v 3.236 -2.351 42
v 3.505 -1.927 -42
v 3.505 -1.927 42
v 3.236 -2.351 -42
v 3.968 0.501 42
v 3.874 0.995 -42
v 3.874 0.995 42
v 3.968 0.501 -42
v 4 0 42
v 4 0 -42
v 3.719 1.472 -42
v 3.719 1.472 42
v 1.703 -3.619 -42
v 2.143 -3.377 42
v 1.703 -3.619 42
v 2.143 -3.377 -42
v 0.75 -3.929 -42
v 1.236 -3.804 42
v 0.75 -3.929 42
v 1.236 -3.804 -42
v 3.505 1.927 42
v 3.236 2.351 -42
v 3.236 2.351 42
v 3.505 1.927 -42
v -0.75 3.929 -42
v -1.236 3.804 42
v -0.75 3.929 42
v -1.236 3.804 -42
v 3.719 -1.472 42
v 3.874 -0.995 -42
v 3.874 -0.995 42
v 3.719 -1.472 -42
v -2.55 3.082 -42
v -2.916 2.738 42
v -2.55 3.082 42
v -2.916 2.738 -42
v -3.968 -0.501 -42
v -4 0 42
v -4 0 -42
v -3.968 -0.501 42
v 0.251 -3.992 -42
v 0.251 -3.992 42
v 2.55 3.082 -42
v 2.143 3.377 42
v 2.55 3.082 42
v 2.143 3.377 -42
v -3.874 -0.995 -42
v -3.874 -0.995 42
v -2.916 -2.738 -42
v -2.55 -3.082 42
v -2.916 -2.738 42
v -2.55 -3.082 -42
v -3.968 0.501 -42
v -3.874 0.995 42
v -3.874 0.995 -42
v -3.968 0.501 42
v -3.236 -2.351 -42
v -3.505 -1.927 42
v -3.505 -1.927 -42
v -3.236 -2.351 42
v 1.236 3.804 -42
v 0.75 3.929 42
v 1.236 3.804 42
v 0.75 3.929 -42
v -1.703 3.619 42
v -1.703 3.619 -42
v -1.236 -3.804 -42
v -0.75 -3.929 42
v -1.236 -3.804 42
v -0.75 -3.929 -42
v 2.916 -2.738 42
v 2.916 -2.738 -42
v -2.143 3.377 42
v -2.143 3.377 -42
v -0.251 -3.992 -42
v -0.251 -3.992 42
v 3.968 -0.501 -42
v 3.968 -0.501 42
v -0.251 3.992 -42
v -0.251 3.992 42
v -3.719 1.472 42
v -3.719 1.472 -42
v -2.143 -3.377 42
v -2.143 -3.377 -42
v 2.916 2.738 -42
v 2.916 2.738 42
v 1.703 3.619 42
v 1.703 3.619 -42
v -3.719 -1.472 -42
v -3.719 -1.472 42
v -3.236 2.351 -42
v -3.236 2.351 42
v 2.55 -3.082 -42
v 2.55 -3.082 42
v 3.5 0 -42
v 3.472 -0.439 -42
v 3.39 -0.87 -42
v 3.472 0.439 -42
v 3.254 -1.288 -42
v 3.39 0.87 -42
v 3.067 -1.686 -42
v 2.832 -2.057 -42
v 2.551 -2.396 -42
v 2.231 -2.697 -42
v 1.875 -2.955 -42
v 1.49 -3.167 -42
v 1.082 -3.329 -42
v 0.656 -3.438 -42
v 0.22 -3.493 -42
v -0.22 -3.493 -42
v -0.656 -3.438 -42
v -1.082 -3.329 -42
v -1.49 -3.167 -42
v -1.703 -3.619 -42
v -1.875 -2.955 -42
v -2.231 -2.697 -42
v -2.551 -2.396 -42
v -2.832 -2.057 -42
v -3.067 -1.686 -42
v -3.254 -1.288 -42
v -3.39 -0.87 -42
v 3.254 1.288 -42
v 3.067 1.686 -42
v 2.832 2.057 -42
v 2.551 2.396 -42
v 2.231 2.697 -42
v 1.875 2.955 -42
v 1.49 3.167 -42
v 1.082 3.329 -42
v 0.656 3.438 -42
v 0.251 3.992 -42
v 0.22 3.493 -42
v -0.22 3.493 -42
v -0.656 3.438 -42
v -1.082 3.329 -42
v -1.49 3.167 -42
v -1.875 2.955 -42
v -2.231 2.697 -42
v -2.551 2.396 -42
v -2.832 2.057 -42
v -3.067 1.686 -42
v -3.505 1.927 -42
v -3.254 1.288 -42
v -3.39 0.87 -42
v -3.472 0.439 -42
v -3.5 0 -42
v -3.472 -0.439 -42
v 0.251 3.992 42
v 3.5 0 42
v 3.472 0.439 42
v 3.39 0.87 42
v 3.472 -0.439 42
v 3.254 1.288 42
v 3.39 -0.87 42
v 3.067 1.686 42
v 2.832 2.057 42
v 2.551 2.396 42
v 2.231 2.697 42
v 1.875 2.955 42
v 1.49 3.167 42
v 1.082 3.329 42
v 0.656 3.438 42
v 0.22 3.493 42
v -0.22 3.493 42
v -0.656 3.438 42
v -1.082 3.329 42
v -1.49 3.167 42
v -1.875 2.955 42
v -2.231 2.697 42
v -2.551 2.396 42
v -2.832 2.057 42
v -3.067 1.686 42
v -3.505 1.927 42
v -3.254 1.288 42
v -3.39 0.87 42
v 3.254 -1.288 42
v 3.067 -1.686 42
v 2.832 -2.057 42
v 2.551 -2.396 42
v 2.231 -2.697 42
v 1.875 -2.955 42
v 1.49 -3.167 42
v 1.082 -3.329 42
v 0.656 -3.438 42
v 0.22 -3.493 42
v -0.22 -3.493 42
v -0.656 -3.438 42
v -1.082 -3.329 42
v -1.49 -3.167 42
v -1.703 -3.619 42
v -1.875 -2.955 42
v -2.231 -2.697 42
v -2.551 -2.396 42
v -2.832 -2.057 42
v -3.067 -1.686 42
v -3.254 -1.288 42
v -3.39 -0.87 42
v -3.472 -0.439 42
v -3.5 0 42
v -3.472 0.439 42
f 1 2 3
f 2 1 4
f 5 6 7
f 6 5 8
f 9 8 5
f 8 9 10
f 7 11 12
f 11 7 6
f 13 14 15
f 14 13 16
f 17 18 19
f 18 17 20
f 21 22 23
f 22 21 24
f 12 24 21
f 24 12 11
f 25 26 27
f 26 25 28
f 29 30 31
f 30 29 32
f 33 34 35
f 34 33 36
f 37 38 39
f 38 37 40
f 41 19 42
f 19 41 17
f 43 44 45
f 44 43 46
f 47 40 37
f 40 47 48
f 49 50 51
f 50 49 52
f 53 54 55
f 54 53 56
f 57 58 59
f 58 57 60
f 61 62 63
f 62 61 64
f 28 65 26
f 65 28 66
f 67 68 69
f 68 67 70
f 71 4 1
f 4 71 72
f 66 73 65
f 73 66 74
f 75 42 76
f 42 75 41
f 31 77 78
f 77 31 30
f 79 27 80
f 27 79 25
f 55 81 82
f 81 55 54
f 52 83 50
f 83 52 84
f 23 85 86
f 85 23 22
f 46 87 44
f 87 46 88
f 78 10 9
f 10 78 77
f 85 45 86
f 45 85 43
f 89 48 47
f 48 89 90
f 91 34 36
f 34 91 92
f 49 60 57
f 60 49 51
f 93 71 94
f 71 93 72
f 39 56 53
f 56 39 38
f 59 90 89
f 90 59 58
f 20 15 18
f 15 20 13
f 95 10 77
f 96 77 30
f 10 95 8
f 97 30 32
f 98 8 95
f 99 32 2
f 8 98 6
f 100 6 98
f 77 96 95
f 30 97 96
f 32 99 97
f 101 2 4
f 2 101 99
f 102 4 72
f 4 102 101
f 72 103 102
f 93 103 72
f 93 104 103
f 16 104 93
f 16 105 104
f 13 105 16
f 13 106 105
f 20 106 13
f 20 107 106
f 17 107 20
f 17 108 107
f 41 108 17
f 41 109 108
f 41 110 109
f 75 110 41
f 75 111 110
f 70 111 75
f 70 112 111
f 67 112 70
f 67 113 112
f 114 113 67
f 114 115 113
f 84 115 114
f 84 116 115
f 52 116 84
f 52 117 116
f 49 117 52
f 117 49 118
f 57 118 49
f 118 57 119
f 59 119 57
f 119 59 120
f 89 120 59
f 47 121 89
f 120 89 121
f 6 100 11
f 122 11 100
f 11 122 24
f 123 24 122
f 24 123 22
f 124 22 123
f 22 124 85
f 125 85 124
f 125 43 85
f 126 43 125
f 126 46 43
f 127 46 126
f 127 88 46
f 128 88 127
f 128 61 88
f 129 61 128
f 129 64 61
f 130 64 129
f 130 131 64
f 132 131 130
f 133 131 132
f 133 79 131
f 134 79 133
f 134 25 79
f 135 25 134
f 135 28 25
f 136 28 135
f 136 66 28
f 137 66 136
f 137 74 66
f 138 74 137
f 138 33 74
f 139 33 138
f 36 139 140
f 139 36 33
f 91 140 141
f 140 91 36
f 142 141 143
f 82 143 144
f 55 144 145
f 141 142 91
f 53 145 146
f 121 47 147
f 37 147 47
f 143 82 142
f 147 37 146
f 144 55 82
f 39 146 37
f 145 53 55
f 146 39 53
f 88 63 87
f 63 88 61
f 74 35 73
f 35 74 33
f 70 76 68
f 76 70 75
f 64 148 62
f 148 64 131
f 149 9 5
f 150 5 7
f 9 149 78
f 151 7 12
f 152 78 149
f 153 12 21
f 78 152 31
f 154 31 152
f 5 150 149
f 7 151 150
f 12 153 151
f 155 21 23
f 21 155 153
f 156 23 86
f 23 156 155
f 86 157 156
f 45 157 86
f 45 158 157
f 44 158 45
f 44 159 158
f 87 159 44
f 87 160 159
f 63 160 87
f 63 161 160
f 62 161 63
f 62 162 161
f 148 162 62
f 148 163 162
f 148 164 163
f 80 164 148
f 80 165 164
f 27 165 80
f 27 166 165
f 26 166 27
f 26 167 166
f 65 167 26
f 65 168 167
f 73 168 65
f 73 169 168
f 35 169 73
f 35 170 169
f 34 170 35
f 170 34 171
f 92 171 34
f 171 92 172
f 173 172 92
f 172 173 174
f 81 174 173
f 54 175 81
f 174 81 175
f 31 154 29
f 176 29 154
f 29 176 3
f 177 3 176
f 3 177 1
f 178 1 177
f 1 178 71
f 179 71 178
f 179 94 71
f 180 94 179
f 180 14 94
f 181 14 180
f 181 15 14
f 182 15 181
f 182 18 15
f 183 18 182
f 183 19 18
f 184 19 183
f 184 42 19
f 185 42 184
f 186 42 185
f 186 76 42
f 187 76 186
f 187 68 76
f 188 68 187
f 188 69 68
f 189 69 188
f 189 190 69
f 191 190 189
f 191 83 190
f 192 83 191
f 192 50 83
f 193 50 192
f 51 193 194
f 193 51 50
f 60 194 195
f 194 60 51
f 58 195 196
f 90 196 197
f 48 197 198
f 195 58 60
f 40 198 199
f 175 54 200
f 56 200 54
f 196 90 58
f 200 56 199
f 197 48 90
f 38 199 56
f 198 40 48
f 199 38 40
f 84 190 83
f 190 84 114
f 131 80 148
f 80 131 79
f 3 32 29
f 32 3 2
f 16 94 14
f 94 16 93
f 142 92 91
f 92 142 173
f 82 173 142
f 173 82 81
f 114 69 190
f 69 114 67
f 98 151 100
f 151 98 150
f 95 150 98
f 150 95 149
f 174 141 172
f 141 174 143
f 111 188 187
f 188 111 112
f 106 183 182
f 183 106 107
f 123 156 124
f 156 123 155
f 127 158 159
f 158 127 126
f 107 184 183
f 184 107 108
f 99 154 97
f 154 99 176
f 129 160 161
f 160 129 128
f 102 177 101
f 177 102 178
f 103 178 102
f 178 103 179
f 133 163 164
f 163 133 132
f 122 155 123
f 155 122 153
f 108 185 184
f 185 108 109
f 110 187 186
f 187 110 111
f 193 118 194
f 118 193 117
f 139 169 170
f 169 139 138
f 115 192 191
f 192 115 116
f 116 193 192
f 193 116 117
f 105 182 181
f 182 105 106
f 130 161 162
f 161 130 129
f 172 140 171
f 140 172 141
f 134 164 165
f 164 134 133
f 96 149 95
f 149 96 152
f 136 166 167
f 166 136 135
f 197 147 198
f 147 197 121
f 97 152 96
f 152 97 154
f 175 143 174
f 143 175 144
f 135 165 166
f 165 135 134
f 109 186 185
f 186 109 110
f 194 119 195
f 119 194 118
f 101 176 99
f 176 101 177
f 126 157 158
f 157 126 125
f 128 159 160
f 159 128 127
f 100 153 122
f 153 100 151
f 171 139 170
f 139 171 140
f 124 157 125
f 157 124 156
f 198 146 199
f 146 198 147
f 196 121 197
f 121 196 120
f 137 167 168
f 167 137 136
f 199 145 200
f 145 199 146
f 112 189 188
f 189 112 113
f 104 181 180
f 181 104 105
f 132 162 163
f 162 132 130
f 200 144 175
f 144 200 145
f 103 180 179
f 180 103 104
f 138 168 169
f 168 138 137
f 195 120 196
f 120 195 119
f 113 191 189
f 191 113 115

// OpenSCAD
$fn = 50;


difference() {
	union() {
		translate(v = [0, 0, -42.0000000000]) {
			cylinder(h = 84, r = 4.0000000000);
		}
	}
	union() {
		translate(v = [0, 0, -100.0000000000]) {
			cylinder(h = 200, r = 3.5000000000);
		}
	}
}
